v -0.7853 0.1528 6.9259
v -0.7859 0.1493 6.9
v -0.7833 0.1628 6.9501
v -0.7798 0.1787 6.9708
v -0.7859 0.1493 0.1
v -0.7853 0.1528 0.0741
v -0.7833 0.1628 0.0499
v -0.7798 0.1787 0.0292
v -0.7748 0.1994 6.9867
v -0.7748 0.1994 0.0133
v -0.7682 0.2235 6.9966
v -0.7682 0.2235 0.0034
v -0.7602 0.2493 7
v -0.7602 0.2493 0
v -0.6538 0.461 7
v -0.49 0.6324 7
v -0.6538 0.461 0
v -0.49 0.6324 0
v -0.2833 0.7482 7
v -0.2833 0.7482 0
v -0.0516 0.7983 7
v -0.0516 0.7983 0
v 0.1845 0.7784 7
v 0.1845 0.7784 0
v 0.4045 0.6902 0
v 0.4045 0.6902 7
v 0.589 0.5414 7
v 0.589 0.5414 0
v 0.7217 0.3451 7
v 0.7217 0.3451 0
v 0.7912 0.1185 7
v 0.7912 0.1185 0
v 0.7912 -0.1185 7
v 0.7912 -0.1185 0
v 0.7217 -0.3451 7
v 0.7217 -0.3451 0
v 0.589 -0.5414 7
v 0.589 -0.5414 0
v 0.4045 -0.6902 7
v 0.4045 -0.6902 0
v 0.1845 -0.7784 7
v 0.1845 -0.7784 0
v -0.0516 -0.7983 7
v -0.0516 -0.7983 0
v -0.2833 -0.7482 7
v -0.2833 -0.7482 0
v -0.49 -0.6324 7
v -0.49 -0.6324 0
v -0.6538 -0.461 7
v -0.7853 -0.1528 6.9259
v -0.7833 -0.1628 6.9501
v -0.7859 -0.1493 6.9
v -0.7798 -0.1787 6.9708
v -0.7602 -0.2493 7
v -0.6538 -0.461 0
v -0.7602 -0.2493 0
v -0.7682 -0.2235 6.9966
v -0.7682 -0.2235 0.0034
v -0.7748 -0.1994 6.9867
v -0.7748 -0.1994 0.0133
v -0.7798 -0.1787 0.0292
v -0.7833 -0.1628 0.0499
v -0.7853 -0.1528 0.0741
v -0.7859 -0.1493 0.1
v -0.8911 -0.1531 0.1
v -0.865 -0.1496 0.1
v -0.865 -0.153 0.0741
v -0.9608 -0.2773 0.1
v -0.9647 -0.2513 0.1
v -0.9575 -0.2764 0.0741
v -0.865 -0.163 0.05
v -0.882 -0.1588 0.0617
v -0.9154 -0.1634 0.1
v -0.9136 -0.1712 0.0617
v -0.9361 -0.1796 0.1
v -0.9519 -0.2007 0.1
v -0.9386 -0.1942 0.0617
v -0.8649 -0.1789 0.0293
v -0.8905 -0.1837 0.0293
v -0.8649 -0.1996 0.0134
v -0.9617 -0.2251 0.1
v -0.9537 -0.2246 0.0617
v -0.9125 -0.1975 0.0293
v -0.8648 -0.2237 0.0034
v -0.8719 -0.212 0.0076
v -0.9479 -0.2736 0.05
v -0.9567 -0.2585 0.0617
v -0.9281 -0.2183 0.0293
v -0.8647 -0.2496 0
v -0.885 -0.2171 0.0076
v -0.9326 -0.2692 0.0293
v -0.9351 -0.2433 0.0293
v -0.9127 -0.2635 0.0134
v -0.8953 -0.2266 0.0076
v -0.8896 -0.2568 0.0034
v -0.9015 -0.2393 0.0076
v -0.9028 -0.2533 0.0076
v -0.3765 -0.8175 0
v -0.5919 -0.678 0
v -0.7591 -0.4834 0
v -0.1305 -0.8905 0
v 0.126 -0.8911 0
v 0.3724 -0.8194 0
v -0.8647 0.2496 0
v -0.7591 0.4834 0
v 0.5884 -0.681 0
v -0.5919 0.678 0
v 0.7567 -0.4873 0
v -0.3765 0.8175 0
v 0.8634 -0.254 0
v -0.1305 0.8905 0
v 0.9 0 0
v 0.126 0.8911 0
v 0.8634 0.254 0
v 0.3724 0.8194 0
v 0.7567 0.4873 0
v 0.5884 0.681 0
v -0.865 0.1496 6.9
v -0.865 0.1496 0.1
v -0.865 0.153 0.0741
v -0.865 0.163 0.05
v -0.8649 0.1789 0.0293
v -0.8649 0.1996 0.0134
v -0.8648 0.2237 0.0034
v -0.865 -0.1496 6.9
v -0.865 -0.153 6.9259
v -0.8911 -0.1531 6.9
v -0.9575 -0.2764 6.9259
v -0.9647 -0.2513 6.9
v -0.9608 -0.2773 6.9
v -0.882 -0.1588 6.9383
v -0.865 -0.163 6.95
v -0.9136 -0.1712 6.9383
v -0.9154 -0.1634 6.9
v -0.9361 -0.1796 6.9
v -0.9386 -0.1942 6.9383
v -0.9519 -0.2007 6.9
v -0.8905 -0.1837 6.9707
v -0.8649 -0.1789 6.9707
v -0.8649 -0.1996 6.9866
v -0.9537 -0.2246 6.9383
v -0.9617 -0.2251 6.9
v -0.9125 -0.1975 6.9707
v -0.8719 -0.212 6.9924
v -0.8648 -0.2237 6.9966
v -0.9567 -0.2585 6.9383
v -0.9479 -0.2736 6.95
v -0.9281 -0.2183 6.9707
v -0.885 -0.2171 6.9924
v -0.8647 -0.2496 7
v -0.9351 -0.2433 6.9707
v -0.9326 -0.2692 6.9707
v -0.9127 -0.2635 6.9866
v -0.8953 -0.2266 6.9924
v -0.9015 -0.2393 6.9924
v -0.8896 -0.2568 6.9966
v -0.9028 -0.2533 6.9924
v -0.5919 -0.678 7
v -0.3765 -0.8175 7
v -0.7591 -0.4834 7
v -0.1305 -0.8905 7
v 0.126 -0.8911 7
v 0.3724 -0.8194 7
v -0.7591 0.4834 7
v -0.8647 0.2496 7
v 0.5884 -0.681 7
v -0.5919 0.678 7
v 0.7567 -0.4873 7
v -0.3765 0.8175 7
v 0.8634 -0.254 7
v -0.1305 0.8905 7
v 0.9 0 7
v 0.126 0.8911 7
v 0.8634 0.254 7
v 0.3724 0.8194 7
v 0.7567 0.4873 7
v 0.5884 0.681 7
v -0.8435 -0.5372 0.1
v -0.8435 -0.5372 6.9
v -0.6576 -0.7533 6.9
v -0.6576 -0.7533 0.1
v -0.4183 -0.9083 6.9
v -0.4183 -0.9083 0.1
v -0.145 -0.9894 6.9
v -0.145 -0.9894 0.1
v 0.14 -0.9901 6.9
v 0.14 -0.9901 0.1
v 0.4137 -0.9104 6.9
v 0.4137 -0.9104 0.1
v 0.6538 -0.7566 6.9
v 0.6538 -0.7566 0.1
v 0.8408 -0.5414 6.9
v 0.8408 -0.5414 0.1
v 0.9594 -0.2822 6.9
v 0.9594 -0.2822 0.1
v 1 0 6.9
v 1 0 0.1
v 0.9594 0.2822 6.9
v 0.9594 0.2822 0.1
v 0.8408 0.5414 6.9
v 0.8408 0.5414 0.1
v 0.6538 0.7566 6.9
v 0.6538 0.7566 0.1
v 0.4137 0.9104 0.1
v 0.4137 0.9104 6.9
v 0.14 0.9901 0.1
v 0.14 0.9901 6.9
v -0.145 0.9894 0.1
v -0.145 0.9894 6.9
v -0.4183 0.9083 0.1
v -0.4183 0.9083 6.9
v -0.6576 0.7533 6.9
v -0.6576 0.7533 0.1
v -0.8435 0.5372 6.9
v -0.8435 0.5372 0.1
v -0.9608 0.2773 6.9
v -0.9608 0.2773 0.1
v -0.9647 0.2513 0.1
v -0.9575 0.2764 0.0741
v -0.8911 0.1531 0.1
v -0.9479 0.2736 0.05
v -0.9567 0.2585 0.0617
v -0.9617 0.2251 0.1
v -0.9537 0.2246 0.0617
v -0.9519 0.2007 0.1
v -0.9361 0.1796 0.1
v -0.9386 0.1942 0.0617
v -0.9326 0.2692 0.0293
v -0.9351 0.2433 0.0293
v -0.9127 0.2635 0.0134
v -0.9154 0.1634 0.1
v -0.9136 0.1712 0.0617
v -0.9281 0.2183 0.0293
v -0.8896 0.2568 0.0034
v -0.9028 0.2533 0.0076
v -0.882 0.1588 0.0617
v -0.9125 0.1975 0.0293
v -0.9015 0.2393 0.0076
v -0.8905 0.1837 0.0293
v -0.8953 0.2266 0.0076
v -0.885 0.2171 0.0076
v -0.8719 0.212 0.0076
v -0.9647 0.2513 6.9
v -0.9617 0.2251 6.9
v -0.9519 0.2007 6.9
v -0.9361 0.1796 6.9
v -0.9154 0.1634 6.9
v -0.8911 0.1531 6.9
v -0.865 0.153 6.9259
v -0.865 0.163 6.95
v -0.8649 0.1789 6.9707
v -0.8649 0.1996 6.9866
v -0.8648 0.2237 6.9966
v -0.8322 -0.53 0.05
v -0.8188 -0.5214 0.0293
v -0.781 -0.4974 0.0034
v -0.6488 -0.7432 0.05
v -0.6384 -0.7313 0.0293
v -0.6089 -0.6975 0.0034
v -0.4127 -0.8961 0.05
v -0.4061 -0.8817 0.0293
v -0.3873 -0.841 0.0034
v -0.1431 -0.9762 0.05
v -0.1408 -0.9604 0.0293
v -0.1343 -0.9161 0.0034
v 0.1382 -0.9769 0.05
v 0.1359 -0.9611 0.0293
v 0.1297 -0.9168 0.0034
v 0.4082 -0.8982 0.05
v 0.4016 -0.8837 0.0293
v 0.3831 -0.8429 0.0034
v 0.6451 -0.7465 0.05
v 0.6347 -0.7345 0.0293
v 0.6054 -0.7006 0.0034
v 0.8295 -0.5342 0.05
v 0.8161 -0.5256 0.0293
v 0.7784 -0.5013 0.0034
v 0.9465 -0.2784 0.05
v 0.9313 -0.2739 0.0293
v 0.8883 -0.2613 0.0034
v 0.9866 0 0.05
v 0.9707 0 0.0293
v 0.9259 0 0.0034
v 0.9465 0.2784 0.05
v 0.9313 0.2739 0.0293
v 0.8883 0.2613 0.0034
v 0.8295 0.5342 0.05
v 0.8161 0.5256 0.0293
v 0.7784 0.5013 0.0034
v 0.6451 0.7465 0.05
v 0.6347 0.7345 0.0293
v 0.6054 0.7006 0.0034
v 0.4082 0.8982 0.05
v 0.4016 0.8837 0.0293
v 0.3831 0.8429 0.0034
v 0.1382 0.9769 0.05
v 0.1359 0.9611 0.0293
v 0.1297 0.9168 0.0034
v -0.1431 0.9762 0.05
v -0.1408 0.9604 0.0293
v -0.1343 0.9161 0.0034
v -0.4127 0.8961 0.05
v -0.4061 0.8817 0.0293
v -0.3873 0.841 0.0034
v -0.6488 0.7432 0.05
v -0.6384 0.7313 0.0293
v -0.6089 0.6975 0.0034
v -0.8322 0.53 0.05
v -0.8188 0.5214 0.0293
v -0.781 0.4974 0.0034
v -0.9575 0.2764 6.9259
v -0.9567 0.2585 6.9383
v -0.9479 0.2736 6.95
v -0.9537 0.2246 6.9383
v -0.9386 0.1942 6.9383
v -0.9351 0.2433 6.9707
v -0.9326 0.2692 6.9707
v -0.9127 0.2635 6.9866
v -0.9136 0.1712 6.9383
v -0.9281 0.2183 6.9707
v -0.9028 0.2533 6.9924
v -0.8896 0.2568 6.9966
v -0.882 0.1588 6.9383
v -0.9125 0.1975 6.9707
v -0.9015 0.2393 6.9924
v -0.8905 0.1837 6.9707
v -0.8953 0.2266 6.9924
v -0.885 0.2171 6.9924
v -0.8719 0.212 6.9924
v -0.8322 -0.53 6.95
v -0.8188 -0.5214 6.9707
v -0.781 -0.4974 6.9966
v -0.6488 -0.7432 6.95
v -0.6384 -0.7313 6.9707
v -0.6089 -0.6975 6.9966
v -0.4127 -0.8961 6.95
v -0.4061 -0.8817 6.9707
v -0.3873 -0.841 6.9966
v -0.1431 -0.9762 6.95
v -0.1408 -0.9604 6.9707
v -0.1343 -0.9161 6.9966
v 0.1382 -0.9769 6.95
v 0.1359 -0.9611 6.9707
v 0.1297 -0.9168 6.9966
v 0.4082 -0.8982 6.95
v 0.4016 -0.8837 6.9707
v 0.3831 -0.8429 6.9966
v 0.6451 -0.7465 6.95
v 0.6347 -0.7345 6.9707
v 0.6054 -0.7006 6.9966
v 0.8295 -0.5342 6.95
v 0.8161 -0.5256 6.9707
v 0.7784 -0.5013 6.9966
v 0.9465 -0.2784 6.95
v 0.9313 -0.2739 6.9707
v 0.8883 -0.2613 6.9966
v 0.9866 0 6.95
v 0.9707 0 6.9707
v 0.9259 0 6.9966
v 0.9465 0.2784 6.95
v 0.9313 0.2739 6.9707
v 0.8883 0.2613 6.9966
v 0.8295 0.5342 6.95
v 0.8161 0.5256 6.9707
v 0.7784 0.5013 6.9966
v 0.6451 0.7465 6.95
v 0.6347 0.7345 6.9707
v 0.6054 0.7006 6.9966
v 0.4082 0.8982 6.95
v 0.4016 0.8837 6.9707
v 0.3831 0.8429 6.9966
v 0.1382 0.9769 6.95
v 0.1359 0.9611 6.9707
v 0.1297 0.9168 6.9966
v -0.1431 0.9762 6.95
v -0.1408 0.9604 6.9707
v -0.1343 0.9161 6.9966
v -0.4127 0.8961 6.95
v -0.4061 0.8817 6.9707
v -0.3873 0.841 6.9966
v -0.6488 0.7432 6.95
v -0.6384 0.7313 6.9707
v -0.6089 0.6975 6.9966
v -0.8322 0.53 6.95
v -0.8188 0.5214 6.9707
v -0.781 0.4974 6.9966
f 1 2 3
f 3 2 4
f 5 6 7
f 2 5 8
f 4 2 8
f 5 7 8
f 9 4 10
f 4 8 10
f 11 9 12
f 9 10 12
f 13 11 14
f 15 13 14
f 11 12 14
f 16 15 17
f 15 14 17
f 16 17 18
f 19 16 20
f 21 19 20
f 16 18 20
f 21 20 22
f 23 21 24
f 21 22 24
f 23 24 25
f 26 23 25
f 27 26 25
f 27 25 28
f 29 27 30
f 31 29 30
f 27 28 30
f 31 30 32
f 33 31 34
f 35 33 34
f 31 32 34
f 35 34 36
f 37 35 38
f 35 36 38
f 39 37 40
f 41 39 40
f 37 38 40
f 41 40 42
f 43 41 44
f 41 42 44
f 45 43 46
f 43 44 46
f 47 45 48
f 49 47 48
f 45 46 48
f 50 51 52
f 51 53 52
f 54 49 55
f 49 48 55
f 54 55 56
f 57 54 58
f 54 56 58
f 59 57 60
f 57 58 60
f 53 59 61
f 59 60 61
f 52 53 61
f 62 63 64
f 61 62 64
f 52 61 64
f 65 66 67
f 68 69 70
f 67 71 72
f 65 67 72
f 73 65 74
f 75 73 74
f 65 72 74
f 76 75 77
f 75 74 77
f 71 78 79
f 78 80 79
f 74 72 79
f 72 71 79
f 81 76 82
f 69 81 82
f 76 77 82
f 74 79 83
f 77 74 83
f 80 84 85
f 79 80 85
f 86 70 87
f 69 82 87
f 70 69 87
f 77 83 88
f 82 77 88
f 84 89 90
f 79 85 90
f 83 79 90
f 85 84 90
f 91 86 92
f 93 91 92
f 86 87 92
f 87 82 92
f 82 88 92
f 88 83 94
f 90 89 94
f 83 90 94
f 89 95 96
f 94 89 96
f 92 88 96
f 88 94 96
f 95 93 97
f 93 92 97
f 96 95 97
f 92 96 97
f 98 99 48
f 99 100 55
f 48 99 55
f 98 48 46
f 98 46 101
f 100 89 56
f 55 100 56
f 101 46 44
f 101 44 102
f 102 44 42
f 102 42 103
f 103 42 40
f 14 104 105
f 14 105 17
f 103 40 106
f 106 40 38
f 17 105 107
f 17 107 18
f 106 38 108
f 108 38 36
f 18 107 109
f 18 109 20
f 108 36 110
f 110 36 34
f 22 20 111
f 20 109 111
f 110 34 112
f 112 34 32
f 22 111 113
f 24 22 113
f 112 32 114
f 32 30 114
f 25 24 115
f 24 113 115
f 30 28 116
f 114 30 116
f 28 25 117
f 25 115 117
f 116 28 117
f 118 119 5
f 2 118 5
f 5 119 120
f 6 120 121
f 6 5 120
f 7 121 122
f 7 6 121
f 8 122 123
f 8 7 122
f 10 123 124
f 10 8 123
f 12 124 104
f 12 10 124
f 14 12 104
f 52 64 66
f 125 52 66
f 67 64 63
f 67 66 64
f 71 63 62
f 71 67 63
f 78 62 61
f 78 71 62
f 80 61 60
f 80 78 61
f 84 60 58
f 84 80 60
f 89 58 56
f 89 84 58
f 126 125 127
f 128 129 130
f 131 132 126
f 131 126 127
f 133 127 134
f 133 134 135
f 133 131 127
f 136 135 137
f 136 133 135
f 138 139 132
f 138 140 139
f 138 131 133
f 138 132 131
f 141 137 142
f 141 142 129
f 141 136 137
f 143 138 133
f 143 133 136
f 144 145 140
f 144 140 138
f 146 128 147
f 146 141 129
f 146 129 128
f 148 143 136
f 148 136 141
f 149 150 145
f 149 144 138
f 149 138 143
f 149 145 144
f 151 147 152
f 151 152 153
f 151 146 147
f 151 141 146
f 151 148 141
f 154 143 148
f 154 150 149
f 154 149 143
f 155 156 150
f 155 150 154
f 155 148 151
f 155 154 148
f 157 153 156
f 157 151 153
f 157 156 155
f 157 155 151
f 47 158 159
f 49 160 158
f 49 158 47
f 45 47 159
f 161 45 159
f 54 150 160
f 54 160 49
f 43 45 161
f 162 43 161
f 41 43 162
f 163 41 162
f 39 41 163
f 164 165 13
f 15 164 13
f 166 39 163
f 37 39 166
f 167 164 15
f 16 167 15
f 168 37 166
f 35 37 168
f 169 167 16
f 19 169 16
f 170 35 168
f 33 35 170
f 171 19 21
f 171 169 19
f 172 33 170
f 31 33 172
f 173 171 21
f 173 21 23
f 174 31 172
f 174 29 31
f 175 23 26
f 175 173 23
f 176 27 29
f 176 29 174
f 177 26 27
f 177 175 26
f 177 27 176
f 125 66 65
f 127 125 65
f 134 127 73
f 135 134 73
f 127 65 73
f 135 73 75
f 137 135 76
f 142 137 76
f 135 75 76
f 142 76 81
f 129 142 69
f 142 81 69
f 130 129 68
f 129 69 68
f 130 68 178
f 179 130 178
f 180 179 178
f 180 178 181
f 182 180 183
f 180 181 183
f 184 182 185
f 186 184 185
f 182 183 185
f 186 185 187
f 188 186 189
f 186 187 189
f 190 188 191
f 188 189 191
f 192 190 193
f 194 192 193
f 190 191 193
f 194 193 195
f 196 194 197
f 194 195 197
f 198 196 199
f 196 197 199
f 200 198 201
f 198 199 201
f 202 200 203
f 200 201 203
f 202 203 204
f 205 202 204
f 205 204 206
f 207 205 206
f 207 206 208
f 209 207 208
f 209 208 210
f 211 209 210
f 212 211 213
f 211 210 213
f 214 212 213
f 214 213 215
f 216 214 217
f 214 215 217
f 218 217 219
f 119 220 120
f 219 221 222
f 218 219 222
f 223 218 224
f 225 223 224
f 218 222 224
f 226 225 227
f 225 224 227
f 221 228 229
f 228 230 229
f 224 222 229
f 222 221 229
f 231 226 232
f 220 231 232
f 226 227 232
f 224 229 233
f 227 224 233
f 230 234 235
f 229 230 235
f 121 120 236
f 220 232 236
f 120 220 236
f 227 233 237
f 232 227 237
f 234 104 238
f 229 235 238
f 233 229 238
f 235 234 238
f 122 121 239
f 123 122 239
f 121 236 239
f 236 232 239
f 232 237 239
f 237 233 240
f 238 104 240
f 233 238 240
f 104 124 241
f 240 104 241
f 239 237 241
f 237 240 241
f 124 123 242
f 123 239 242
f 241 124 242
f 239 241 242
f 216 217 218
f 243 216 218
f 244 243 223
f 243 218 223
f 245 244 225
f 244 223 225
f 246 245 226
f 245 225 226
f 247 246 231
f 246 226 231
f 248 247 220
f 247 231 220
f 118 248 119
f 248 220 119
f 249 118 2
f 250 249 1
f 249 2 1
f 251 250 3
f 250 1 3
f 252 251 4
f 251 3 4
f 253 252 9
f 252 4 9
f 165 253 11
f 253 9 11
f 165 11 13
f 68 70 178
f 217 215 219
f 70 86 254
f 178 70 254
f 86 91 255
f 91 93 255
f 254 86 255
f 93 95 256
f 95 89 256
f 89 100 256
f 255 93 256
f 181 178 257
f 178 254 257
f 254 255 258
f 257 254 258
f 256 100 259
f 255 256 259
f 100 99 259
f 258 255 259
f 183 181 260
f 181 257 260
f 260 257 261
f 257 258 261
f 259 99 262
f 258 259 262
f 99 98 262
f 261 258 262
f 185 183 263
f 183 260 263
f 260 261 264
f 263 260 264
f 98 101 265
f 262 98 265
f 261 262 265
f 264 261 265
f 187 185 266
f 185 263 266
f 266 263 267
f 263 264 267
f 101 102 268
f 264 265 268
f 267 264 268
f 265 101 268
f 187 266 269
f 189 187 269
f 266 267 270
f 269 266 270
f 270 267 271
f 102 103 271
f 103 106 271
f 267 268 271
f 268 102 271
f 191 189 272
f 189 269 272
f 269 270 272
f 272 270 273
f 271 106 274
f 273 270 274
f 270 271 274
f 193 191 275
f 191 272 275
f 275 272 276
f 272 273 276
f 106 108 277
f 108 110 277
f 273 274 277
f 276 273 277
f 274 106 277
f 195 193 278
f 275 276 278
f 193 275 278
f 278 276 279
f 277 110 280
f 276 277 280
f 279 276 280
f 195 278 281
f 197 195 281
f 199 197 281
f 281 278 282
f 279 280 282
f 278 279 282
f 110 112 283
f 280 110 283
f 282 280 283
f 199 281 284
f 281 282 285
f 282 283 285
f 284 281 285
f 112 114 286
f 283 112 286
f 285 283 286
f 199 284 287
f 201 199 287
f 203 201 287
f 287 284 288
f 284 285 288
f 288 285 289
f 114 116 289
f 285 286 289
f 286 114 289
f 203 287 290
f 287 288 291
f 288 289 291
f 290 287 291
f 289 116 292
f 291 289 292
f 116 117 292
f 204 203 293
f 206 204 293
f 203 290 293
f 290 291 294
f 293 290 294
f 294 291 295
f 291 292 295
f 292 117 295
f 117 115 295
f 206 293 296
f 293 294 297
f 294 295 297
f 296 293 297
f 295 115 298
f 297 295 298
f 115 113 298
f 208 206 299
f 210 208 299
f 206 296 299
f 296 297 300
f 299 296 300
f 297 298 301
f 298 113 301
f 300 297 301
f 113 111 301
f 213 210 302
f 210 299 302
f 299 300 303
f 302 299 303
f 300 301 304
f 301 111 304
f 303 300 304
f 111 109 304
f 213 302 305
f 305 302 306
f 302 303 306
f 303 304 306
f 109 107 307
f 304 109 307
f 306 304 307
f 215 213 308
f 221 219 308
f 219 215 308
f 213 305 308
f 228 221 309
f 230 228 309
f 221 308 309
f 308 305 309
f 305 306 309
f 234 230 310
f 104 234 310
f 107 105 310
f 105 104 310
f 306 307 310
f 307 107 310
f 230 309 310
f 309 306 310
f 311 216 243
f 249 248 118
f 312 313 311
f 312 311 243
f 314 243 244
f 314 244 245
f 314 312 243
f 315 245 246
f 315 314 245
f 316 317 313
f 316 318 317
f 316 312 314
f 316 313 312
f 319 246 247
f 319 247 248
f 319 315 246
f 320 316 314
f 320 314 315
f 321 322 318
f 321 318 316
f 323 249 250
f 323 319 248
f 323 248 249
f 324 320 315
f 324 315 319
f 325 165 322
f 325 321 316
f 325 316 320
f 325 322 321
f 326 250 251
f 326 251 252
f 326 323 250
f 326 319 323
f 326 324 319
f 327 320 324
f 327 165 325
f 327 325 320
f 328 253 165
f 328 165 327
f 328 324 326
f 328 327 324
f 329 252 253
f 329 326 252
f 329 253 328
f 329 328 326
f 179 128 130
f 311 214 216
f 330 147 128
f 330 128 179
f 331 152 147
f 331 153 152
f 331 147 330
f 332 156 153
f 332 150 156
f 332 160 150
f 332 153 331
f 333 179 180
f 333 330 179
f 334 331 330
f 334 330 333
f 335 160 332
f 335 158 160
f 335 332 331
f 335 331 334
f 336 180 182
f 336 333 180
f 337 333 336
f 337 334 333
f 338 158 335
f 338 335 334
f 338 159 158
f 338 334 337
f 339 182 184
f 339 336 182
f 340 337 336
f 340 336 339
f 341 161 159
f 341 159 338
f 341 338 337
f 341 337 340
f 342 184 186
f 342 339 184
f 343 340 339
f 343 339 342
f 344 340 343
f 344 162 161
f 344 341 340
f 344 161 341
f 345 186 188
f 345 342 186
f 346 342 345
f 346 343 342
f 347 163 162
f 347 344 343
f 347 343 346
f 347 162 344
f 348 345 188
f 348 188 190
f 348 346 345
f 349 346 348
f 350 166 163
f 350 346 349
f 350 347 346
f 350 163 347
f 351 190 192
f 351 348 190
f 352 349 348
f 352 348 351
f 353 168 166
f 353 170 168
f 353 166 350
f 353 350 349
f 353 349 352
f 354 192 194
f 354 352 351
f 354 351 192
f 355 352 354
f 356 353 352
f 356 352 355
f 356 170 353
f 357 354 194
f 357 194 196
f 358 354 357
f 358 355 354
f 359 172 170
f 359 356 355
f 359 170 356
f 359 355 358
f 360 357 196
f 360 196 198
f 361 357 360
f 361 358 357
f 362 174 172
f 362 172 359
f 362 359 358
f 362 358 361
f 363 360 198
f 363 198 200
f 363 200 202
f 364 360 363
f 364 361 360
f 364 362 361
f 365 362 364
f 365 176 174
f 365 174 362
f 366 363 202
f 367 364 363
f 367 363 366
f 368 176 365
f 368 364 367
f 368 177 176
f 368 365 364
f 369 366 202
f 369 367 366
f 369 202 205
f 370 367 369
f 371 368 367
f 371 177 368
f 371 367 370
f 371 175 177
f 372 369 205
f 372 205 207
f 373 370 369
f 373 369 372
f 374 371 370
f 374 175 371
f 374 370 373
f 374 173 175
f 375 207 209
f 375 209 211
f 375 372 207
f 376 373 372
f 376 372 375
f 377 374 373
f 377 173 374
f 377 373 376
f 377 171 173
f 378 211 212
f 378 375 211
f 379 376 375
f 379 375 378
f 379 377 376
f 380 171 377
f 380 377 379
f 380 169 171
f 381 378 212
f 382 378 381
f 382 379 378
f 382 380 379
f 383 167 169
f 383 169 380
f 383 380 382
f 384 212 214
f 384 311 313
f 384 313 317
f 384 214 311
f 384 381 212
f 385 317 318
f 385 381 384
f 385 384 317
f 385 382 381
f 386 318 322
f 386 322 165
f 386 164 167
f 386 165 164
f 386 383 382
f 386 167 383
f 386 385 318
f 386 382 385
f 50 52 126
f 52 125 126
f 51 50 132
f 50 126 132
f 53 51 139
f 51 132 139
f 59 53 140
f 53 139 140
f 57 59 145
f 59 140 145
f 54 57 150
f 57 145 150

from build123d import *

# Parameters (mm, degrees)
RESSALTO_EXTRUS_O1_DEPTH = 7
FILETE1_R                = 0.1


with BuildPart() as part:
    # Esboço1 → Ressalto-extrusão1 (new body)
    with BuildSketch(Plane.XY):
        with BuildLine():
            Line((-0.865023226, 0.149597058), (-0.7859375, 0.149339366))
            ThreePointArc((-0.7859375, 0.149339366), (0.8, 0), (-0.7859375, -0.149339366))
            Line((-0.7859375, -0.149339366), (-0.865023226, -0.149597058))
            ThreePointArc((-0.865023226, -0.149597058), (-0.944711717, -0.189615637), (-0.960774876, -0.277329475))
            ThreePointArc((-0.960774876, -0.277329475), (1, 0), (-0.960774876, 0.277329475))
            ThreePointArc((-0.960774876, 0.277329475), (-0.944711717, 0.189615637), (-0.865023226, 0.149597058))
        make_face()
    extrude(amount=RESSALTO_EXTRUS_O1_DEPTH)

    # Filete1
    filete1_edges = [part.edges().sort_by_distance(p)[0] for p in [
        (-0.944711717, -0.189615637, 7),
        (1, 0, 7),
        (-0.944711717, 0.189615637, 7),
        (-0.825480363, 0.149468212, 7),
        (-0.825480363, 0.149468212, 0),
        (-0.944711717, 0.189615637, 0),
        (1, 0, 0),
        (-0.825480363, -0.149468212, 7),
        (-0.944711717, -0.189615637, 0),
        (-0.825480363, -0.149468212, 0),
    ]]
    fillet(filete1_edges, radius=FILETE1_R)


solid = part.part
